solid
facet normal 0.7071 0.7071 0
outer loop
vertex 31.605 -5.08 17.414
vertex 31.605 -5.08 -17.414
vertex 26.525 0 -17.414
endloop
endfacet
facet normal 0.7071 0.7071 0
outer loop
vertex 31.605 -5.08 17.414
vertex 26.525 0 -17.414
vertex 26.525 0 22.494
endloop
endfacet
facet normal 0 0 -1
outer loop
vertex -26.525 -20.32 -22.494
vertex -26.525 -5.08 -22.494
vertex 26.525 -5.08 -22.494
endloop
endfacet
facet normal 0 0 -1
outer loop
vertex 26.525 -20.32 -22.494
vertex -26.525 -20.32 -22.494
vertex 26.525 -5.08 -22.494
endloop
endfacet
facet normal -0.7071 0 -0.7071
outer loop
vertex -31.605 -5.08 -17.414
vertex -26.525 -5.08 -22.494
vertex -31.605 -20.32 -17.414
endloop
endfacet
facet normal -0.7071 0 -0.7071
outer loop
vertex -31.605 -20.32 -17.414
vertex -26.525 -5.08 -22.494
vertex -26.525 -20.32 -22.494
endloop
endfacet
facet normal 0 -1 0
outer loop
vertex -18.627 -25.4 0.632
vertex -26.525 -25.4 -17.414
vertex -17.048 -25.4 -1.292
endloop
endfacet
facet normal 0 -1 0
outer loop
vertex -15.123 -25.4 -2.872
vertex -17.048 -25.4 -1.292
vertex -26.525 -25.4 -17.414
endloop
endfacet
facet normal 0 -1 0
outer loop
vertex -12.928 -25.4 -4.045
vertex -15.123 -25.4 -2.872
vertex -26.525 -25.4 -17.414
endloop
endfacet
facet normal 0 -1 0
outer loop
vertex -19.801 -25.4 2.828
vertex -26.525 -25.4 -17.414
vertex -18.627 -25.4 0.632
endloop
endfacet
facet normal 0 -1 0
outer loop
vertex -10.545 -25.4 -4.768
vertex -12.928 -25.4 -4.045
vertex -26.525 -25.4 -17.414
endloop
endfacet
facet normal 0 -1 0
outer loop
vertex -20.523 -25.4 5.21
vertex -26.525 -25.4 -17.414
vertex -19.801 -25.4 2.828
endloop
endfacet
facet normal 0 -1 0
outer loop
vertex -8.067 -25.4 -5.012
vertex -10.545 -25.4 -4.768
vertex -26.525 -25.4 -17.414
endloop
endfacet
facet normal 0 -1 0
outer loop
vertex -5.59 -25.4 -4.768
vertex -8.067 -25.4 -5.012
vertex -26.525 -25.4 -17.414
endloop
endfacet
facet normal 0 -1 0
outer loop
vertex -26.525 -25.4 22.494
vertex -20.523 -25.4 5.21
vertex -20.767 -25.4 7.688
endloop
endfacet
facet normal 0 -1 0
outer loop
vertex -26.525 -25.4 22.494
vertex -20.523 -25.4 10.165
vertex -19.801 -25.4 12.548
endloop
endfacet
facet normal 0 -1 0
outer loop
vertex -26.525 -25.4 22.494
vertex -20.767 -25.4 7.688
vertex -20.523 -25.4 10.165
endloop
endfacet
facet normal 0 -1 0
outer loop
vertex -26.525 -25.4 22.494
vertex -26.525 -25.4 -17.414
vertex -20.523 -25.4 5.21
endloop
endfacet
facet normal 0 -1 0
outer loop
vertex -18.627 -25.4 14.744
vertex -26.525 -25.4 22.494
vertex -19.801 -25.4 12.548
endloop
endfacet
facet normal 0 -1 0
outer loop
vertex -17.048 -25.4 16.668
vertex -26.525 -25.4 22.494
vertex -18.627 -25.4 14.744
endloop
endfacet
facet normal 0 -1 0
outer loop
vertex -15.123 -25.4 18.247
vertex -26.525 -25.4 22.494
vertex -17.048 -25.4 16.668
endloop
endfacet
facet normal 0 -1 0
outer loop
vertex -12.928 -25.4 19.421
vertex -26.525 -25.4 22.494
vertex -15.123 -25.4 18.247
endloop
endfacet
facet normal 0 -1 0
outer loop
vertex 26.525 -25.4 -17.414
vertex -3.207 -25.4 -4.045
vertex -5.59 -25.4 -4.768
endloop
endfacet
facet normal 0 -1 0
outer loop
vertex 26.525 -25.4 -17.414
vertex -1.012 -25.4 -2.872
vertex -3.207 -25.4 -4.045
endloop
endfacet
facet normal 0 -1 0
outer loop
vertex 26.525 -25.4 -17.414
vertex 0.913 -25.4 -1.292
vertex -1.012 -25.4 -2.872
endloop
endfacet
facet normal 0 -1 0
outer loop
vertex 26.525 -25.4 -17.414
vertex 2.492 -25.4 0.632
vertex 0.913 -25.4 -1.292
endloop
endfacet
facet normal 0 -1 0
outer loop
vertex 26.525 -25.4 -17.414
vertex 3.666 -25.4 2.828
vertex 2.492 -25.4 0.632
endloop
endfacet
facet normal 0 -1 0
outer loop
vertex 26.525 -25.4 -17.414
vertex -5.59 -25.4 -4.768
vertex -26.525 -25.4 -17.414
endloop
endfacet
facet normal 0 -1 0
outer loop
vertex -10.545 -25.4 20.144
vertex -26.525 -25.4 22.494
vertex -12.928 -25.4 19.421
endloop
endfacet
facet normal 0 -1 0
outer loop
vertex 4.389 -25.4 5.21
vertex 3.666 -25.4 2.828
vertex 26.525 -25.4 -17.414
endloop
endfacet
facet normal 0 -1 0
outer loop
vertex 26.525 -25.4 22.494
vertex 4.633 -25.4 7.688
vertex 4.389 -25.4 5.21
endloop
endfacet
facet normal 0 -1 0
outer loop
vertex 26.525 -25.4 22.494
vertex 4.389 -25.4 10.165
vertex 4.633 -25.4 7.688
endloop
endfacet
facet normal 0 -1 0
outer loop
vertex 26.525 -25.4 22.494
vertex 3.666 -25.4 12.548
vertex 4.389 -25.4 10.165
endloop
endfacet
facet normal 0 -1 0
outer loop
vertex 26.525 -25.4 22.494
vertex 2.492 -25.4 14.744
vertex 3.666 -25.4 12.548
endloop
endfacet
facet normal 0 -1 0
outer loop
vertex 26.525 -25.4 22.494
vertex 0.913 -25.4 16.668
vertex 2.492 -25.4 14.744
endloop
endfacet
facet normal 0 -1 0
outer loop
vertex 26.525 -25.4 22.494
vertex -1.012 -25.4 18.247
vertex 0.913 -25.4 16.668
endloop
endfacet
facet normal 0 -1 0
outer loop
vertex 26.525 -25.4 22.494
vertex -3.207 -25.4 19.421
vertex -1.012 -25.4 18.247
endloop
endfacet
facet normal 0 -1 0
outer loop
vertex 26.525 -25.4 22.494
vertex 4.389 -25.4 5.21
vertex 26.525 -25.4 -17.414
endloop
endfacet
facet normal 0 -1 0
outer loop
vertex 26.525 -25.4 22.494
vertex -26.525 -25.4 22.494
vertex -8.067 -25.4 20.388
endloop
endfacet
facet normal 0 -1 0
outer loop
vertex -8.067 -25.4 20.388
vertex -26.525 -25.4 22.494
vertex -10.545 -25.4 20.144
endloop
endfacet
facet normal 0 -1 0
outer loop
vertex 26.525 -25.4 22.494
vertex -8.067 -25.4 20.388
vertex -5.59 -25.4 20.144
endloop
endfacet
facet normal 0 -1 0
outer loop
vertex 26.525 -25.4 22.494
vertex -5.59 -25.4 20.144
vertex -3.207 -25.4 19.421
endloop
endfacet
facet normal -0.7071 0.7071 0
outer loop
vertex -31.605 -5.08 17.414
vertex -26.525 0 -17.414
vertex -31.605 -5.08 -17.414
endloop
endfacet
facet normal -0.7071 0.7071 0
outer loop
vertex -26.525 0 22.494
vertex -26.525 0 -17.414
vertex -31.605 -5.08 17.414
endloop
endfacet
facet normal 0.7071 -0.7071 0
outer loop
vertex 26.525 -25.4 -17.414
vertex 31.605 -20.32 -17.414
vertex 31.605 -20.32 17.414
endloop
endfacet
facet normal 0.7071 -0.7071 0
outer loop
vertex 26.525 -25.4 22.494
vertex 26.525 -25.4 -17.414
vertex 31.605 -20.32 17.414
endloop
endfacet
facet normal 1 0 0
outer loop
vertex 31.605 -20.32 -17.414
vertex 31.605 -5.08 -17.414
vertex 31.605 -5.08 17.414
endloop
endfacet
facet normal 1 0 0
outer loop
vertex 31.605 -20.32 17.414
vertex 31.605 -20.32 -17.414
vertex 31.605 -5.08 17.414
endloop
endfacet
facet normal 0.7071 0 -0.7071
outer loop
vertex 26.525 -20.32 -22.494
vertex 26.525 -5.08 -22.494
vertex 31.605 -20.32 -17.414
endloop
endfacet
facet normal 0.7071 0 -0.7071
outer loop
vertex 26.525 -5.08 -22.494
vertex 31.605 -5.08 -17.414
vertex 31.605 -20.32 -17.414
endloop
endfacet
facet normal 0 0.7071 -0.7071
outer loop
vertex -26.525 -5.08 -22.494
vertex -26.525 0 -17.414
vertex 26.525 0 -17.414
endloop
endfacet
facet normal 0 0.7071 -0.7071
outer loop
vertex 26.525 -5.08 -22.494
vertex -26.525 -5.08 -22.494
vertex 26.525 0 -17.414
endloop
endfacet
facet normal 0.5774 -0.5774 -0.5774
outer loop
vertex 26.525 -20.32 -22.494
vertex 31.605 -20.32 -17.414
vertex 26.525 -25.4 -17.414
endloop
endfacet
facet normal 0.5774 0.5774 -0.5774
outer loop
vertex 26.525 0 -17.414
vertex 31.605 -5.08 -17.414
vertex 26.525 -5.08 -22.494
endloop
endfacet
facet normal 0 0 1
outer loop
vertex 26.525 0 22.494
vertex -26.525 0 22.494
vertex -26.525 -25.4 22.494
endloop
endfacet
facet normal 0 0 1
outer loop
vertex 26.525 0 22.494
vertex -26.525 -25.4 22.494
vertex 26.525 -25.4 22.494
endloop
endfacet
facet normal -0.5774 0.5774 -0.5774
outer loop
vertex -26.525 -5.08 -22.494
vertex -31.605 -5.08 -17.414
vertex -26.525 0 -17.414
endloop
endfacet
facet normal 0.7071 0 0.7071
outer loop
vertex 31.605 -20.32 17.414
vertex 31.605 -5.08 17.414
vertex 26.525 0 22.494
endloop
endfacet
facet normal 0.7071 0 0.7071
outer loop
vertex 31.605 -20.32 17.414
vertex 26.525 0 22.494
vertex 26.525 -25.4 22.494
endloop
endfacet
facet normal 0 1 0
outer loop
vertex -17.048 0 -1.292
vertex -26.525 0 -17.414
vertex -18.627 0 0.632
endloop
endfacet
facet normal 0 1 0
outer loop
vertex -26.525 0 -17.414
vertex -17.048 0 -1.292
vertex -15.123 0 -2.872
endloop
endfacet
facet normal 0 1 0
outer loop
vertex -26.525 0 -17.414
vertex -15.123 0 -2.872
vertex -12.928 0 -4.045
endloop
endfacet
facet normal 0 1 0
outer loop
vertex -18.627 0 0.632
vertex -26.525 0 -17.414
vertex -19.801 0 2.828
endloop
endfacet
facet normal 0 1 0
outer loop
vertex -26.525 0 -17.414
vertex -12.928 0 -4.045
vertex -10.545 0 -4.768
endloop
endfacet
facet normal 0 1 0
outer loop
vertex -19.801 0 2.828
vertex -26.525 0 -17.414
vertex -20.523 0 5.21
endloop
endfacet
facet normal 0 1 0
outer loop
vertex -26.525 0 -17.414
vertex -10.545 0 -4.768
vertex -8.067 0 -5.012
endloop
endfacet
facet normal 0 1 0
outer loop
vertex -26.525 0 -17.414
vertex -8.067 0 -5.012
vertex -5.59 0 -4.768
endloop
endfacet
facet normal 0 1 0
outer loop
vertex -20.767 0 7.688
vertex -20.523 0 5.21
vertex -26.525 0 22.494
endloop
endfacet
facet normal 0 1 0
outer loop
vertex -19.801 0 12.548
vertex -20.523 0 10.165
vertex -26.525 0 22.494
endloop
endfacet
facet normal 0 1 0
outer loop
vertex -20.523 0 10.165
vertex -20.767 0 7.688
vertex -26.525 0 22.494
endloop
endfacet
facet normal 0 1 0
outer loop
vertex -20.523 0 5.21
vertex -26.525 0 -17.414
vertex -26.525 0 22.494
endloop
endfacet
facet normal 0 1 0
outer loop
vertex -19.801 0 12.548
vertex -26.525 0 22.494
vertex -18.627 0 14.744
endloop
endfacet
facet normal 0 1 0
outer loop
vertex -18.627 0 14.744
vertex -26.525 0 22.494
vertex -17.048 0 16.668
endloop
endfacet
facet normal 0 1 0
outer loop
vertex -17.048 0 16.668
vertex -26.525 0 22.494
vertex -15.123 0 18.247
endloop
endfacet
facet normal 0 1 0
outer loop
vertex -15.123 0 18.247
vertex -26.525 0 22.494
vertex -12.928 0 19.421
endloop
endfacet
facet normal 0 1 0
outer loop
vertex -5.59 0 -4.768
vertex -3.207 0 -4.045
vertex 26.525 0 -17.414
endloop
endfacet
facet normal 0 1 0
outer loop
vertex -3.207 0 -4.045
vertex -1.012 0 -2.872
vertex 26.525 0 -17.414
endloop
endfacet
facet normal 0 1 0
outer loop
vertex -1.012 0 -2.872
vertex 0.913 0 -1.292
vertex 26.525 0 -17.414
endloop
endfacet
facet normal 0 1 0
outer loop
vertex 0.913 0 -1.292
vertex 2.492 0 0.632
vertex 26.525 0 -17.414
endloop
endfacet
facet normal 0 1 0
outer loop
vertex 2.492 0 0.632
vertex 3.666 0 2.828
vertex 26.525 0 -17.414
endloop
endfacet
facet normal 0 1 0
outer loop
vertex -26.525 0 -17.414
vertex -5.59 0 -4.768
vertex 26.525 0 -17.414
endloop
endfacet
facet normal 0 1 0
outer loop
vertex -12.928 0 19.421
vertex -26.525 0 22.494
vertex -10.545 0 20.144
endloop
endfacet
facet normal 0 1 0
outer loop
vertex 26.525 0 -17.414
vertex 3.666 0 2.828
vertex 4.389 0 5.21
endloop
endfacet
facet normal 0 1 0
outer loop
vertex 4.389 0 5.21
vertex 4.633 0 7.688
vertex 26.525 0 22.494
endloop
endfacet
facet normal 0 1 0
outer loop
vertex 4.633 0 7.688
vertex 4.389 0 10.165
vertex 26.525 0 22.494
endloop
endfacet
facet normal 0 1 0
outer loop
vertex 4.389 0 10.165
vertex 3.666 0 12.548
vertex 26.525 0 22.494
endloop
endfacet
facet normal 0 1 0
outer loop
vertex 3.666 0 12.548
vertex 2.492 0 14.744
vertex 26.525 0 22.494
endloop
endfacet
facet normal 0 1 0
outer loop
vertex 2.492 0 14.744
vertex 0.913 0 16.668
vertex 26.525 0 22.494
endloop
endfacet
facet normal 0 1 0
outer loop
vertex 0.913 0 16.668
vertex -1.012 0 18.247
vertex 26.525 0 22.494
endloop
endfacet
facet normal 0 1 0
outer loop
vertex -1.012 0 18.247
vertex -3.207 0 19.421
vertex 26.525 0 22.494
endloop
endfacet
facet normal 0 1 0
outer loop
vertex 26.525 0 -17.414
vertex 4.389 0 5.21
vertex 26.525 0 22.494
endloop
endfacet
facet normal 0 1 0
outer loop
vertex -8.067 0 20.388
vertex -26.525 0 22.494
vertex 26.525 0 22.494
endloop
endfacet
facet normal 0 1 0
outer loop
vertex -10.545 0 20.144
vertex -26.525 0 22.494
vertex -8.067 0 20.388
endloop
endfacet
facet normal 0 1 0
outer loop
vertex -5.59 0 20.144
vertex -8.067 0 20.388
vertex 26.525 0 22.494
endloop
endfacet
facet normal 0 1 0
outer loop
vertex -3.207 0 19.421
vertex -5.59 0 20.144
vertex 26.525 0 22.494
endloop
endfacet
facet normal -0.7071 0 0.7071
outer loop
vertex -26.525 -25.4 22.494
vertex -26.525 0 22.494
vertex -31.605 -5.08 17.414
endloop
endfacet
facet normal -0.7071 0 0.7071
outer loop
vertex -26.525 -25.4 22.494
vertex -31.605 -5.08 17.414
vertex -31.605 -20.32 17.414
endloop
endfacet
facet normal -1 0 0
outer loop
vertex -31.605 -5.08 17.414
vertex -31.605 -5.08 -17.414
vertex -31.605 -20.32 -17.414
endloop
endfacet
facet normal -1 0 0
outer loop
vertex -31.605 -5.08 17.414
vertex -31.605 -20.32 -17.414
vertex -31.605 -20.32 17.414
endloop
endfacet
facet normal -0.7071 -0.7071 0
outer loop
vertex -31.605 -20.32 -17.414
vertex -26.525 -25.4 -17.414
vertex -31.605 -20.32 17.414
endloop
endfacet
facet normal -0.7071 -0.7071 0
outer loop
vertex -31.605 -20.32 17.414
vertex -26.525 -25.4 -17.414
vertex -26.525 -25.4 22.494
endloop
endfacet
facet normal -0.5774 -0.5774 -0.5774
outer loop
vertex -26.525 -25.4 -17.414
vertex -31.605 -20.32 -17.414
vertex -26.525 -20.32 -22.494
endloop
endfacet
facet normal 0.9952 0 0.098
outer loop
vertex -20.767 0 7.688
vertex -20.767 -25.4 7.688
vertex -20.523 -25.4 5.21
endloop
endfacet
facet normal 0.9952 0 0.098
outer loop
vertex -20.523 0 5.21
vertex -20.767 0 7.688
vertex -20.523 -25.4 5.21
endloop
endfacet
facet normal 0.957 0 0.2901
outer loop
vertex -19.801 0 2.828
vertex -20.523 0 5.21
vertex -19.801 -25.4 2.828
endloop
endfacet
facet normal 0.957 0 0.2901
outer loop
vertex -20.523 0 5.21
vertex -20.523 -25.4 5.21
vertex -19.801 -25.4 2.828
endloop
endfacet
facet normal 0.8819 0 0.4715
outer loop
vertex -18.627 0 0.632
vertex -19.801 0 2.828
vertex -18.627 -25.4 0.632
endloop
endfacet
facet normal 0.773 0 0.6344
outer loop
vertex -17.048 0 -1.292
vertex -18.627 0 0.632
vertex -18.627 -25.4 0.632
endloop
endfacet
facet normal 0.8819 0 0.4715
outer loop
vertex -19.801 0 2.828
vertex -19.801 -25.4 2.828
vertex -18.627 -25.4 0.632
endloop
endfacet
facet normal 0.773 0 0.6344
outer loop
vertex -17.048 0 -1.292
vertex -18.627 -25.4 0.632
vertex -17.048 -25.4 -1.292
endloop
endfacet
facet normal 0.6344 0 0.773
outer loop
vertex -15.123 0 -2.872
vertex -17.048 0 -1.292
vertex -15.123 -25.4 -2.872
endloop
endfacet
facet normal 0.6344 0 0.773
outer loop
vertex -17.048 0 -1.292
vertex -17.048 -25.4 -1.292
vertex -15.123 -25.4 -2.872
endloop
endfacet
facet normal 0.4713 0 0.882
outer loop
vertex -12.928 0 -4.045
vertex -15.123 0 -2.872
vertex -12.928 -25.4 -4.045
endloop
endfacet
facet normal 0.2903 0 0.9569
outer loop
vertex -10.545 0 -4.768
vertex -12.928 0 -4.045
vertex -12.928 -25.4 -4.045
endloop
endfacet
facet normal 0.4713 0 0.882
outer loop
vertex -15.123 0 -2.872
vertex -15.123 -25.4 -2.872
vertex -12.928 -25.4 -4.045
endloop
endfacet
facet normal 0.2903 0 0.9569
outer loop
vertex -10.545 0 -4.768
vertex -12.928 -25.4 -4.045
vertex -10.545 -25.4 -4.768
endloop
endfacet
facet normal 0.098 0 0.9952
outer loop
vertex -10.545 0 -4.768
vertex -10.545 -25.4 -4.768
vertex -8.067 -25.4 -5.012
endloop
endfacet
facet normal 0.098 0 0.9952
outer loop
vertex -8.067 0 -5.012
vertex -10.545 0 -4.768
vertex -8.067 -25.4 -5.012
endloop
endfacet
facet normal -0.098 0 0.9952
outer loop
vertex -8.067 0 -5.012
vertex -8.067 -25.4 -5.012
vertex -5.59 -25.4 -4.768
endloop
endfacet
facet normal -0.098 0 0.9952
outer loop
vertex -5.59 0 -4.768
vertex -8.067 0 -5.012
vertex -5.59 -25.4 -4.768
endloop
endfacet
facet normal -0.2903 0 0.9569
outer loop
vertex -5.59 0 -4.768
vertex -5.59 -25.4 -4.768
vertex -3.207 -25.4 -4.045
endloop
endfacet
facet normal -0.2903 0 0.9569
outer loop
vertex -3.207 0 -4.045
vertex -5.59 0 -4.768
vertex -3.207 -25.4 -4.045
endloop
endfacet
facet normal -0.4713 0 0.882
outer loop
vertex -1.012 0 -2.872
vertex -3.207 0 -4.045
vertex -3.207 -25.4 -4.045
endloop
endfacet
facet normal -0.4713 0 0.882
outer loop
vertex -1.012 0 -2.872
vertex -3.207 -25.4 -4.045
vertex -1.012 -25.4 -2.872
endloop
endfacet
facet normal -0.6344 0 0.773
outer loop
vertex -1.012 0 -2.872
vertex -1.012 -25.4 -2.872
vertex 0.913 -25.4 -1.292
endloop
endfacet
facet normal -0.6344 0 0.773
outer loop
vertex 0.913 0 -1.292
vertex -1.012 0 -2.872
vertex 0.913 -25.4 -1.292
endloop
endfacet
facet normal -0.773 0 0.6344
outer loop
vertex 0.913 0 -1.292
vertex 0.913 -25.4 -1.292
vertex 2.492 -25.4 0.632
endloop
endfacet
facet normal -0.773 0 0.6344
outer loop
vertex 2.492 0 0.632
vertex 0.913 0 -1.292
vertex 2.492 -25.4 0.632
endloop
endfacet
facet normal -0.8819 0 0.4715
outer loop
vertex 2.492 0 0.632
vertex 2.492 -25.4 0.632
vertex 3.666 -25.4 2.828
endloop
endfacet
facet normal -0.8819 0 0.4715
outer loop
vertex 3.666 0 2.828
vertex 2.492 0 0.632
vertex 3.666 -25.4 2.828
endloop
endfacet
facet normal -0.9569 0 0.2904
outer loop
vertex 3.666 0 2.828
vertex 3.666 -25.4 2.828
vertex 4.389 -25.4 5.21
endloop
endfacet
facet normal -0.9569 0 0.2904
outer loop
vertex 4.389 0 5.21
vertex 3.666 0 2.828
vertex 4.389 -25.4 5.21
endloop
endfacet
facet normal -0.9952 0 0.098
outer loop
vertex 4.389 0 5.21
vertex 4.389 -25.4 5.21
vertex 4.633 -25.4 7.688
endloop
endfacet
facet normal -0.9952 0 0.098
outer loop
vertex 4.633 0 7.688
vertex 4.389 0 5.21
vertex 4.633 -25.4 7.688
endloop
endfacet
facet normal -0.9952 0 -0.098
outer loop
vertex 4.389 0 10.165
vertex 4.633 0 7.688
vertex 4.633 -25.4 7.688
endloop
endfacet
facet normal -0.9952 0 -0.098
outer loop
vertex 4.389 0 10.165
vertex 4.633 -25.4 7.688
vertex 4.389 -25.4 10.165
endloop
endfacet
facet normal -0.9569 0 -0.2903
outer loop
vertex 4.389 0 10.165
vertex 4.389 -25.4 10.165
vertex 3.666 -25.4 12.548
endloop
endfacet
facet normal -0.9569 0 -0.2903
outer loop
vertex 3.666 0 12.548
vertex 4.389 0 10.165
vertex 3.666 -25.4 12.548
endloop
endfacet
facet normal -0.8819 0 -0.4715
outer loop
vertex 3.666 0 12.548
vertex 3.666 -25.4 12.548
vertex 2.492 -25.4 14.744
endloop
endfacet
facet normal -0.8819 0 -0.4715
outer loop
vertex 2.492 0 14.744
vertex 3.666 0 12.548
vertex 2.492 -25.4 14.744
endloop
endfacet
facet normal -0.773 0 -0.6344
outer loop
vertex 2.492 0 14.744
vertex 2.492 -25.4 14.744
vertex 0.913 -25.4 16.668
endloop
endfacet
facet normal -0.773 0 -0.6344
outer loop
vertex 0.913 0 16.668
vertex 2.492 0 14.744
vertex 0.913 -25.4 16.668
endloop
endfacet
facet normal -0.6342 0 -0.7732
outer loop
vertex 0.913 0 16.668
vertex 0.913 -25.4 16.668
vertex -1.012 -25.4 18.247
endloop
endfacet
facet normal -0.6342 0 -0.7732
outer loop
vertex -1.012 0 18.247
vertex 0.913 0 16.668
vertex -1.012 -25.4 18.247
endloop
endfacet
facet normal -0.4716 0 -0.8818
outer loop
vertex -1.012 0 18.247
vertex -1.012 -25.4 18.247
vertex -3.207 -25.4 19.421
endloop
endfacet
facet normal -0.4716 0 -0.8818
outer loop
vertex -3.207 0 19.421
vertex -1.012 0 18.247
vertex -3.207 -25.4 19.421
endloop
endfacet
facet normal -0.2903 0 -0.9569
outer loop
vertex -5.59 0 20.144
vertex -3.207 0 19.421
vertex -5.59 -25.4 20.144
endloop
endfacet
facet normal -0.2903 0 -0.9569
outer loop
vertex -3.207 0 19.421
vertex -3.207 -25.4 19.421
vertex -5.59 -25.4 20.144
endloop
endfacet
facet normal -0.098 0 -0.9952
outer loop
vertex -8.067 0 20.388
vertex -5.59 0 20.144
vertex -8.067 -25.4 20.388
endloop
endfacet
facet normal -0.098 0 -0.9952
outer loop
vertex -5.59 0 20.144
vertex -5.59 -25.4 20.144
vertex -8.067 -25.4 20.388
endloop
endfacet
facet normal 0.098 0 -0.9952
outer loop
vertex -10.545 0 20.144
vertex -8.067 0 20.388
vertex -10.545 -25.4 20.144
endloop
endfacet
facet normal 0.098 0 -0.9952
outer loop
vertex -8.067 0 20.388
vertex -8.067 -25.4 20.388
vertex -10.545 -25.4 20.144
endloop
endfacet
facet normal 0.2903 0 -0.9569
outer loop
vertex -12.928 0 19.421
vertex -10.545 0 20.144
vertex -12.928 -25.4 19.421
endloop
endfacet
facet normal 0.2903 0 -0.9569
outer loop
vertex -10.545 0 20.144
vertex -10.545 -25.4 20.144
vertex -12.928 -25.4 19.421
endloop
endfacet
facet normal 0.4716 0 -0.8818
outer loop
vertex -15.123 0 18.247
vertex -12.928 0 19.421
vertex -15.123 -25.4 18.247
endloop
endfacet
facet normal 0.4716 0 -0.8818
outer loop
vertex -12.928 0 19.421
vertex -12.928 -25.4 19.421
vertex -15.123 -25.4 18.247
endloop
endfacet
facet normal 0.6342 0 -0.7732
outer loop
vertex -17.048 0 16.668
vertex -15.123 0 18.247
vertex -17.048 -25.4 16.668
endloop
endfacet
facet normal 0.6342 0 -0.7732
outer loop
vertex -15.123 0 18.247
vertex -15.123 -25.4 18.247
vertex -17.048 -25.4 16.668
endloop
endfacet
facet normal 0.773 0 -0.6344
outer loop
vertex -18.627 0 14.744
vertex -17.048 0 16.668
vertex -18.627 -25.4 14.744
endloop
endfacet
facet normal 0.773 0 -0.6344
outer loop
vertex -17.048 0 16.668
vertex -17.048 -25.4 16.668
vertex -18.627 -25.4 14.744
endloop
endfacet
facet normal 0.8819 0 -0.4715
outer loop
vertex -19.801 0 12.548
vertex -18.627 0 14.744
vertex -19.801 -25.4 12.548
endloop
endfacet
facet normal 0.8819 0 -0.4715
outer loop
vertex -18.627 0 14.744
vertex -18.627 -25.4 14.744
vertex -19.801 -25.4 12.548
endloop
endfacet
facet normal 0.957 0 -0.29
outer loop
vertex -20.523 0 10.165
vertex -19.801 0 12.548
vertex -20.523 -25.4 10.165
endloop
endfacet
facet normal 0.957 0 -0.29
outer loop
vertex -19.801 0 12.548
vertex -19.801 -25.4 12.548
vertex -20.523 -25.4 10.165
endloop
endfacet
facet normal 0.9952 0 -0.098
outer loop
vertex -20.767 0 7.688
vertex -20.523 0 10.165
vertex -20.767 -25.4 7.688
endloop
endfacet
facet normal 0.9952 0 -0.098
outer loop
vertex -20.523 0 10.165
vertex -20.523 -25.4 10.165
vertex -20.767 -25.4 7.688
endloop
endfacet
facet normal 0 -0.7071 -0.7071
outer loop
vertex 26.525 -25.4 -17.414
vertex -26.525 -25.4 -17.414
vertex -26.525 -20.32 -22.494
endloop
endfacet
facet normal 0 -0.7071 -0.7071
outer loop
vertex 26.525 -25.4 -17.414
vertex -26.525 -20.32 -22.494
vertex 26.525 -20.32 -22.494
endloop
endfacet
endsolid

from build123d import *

# Parameters (mm, degrees)
F0_W     = 63.210748136
F0_H     = 44.9878275394
F1_DEPTH = 25.4
F3_D     = 25.4
F4_SIZE  = 5.08


with BuildPart() as f1:
    # F0 (on Front) → F1 (new body)
    with BuildSketch(Plane.XZ):
        Rectangle(F0_W, F0_H)
    extrude(amount=F1_DEPTH)

    # F3 (through all)
    with Locations(Plane(origin=(0, 0, 0), x_dir=(1, 0, 0), z_dir=(0, 1, 0))):
        with Locations((-8.0674383789, -7.687793579)):
            Hole(F3_D / 2)

    # F4
    f4_edges = [f1.edges().sort_by_distance(p)[0] for p in [
        (31.605374, -12.7, -22.493914),
        (31.605374, -12.7, 22.493914),
        (31.605374, 0, 0),
        (31.605374, -25.4, 0),
        (-31.605374, -12.7, 22.493914),
        (-31.605374, -12.7, -22.493914),
        (-31.605374, 0, 0),
        (-31.605374, -25.4, 0),
        (0, 0, -22.493914),
        (0, -25.4, -22.493914),
    ]]
    chamfer(f4_edges, length=F4_SIZE)


solid = f1.part
